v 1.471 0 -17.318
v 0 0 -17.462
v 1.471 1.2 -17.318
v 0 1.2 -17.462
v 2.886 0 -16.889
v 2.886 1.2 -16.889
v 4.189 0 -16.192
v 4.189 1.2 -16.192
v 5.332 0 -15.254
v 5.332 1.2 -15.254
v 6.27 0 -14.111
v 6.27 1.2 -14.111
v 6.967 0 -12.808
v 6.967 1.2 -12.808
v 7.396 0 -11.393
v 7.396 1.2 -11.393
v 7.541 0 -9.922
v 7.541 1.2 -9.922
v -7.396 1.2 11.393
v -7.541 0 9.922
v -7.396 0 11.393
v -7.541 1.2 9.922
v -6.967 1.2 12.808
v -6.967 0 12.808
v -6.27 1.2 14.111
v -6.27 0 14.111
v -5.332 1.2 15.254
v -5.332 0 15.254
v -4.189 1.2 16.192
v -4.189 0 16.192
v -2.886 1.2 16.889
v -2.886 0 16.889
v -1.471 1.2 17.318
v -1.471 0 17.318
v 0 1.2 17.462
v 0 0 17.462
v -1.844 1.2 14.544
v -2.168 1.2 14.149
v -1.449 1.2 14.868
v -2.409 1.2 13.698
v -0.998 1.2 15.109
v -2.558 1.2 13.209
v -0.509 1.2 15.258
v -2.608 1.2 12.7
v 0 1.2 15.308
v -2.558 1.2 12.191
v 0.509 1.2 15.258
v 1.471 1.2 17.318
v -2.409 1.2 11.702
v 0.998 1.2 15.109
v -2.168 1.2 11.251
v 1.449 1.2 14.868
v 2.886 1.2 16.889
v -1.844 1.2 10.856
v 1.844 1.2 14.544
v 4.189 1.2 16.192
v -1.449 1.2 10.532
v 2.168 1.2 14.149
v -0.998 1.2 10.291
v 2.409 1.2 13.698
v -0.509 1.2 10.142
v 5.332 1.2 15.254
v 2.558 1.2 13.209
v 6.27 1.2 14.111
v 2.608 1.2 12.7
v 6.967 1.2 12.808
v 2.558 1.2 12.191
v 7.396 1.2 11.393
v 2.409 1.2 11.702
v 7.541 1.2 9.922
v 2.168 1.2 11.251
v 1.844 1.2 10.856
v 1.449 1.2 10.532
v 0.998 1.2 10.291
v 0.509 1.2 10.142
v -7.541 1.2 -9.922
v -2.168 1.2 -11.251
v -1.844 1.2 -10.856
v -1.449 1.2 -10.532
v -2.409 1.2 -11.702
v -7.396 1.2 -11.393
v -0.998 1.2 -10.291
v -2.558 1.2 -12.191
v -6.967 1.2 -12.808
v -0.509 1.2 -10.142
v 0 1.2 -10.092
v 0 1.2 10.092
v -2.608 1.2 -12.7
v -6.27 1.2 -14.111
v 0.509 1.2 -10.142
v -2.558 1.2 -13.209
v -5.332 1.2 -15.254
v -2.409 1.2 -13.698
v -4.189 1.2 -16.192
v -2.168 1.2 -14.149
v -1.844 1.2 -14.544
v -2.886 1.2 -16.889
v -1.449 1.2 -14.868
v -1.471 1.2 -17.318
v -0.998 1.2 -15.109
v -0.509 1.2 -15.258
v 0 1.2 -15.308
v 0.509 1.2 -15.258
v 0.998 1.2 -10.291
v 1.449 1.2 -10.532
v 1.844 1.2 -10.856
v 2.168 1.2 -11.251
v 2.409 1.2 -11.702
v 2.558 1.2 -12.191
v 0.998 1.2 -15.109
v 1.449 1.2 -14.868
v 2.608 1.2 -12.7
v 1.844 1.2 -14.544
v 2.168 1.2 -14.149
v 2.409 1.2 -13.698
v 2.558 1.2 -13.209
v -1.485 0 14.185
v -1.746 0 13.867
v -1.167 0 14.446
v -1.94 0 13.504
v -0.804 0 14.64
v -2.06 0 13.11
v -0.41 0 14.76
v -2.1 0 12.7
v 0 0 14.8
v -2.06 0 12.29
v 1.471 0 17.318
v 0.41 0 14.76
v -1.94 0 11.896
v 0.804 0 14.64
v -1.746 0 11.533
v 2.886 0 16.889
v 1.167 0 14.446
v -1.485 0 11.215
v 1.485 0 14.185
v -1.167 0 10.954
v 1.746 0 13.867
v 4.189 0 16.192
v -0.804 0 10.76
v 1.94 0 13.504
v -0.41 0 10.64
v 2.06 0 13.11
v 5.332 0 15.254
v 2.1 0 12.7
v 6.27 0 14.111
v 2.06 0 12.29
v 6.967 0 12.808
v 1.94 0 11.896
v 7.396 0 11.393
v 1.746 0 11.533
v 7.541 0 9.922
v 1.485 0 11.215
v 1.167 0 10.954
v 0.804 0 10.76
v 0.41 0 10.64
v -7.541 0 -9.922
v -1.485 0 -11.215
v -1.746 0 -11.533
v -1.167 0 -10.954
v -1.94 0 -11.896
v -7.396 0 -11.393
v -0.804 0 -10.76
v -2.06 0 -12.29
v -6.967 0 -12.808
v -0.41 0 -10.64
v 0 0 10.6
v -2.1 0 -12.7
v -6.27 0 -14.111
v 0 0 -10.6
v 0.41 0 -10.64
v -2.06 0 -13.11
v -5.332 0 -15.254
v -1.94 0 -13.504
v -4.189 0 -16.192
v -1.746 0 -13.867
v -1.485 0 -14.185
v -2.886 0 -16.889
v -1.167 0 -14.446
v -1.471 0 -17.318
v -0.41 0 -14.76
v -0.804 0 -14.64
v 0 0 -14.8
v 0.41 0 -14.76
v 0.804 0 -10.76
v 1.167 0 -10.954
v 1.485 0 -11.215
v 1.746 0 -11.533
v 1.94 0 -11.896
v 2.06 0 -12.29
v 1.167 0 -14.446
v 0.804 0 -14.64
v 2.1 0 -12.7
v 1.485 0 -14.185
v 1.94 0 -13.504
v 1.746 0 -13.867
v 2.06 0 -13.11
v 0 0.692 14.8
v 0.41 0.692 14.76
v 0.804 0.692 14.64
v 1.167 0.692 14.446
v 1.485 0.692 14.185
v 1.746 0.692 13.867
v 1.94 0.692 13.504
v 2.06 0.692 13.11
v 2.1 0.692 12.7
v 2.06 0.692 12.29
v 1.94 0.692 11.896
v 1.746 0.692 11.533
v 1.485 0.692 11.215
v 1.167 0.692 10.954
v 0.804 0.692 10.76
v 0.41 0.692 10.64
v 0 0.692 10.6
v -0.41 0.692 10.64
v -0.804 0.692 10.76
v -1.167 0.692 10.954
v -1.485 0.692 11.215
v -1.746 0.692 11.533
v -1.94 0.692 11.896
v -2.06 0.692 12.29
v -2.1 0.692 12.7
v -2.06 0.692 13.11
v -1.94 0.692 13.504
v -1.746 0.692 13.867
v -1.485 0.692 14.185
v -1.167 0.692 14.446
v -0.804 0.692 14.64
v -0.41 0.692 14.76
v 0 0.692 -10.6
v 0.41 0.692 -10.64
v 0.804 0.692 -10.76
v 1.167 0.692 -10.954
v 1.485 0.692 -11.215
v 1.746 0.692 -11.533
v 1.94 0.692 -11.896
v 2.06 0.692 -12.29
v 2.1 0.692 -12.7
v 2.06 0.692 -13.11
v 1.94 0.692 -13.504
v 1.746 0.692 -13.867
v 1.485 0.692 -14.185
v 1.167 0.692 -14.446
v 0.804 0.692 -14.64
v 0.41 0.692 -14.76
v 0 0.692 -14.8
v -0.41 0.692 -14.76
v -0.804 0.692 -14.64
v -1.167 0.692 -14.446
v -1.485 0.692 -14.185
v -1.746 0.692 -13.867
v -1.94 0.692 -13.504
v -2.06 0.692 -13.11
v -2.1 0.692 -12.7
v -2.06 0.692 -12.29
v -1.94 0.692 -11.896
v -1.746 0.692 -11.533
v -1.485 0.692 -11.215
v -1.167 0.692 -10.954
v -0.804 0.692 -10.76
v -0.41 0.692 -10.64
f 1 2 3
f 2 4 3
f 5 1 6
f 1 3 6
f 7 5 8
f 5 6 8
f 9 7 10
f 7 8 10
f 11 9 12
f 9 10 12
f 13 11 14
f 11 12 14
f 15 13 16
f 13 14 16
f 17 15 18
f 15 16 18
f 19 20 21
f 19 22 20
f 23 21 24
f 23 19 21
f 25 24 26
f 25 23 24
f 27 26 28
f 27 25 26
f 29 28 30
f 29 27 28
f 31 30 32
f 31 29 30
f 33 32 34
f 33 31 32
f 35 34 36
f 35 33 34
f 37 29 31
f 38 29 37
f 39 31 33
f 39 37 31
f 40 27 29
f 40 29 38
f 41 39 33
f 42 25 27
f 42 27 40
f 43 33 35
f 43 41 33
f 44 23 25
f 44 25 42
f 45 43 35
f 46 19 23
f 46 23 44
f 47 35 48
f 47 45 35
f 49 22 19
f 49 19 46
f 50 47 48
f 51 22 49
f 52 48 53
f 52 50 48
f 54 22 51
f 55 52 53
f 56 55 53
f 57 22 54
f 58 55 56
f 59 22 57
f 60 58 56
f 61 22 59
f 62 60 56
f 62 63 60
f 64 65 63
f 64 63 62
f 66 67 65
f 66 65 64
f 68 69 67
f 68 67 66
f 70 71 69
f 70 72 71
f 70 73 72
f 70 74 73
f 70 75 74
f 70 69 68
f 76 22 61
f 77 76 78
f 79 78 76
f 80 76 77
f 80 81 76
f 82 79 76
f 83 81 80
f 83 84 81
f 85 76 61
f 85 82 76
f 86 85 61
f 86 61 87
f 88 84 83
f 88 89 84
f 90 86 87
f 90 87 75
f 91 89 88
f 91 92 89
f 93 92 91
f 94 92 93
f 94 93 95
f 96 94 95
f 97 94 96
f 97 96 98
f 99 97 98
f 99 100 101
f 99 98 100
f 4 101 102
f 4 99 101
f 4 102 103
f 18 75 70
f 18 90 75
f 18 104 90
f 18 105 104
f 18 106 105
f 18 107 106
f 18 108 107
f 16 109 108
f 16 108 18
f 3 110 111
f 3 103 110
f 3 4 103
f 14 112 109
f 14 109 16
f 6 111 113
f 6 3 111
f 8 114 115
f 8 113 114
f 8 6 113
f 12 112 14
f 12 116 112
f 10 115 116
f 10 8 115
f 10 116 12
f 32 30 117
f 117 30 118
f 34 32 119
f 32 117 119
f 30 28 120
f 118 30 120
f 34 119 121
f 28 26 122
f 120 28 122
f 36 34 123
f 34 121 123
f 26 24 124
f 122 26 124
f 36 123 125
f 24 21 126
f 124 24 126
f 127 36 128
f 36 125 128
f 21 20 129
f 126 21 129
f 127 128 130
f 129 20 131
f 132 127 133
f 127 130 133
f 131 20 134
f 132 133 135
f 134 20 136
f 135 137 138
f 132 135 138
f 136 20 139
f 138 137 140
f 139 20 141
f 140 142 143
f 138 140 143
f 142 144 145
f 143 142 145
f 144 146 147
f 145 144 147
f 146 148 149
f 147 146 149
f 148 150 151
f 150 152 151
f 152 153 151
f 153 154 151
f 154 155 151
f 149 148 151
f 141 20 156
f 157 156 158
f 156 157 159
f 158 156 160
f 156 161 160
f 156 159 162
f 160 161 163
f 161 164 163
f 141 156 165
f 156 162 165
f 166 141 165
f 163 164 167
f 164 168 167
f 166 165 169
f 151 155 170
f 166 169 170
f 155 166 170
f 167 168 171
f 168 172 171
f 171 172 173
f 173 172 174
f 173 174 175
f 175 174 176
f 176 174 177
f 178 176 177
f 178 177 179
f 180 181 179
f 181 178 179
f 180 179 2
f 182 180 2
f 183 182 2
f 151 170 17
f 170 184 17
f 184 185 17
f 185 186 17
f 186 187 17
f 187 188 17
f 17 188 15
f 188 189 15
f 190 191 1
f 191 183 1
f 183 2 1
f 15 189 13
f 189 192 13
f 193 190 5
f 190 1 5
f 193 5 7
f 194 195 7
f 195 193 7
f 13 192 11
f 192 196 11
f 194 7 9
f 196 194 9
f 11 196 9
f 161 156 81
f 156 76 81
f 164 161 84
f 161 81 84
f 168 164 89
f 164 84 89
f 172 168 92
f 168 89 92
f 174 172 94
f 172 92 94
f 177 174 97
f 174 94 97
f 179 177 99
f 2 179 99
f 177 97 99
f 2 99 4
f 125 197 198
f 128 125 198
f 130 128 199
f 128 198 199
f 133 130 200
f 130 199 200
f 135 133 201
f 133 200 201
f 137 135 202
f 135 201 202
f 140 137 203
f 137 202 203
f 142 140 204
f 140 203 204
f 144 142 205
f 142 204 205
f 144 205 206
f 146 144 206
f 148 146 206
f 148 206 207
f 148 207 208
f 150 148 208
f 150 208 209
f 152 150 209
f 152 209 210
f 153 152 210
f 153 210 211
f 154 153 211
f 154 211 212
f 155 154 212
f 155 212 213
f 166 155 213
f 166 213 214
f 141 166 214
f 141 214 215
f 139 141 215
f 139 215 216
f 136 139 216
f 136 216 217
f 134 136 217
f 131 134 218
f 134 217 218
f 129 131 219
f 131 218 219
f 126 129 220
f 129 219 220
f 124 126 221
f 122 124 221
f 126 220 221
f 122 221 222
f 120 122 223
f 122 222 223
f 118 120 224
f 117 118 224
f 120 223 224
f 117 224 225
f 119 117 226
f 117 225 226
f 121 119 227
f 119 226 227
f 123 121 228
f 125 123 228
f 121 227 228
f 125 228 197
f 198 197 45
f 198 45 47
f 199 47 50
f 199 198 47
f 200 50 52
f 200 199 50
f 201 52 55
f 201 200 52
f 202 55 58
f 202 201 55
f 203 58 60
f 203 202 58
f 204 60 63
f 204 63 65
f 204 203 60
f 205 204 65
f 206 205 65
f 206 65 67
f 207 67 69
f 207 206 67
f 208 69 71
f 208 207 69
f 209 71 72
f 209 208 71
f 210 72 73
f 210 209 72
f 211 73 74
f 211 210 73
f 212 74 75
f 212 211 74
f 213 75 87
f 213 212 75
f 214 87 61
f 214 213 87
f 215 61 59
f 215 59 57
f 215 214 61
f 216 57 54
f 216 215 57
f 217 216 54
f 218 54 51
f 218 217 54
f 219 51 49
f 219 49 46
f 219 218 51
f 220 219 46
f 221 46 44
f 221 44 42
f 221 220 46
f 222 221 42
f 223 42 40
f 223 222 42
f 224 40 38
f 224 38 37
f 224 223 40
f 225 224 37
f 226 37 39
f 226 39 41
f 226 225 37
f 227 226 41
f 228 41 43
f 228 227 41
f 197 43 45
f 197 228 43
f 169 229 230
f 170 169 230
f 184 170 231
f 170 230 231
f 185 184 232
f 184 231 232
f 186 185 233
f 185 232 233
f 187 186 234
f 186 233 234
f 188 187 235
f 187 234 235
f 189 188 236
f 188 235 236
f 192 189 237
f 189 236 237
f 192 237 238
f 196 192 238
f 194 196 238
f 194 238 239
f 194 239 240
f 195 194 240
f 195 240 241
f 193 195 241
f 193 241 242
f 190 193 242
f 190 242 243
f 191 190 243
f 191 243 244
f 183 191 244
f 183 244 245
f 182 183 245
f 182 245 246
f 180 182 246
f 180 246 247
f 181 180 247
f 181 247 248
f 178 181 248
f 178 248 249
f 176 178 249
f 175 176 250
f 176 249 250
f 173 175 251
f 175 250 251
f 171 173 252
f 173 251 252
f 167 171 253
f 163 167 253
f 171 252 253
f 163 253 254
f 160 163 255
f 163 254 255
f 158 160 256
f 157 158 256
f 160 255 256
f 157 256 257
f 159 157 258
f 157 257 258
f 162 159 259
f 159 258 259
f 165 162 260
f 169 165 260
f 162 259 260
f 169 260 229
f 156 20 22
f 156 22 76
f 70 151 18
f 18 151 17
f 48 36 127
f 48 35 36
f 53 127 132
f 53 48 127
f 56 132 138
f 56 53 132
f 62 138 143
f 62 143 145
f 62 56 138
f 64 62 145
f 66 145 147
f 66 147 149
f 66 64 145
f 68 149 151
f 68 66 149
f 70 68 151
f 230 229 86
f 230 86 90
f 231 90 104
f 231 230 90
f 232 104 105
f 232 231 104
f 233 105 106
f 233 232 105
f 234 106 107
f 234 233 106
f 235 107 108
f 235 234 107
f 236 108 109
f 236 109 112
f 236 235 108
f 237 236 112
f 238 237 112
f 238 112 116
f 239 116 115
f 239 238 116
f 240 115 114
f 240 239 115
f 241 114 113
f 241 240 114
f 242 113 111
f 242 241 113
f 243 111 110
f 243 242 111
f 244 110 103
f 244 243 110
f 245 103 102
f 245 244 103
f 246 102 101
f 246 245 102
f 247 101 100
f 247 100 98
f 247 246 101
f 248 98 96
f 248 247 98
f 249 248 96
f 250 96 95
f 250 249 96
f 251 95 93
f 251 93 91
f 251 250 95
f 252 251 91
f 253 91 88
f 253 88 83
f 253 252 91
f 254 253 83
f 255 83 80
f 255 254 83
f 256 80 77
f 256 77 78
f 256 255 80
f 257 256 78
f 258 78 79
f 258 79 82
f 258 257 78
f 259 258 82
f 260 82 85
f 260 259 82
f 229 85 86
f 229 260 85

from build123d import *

# Parameters (mm, degrees)
SKETCH1_W      = 15.08125
SKETCH1_H      = 34.925
EXTRUDE1_DEPTH = 1.2
SKETCH3_R      = 2.1
EXTRUDE2_DEPTH = 1.984375
CHAMFER1_SIZE  = 0.508
FILLET1_R      = 7.540625
FILLET2_R      = 7.540625


with BuildPart() as part:
    # Sketch1 → Extrude1 (new body)
    with BuildSketch(Plane(origin=(0, 0, 0), x_dir=(1, 0, 0), z_dir=(0, 1, 0))):
        Rectangle(SKETCH1_W, SKETCH1_H)
    extrude(amount=EXTRUDE1_DEPTH)

    # Sketch3 → Extrude2 (cut)
    with BuildSketch(Plane(origin=(0, 1.2, 0), x_dir=(1, 0, 0), z_dir=(0, 1, 0))):
        with Locations(Location((0, 12.7, 0), (0, 0, 270))):
            Circle(SKETCH3_R)
        with Locations(Location((0, -12.7, 0), (0, 0, 270))):
            Circle(SKETCH3_R)
    extrude(amount=-EXTRUDE2_DEPTH, mode=Mode.SUBTRACT)

    # Chamfer1
    chamfer1_edges = [part.edges().sort_by_distance(p)[0] for p in [
        (0, 1.2, -14.8),
        (0, 1.2, 10.6),
    ]]
    chamfer(chamfer1_edges, length=CHAMFER1_SIZE)

    # Fillet1
    fillet1_edges = [part.edges().sort_by_distance(p)[0] for p in [
        (-7.540625, 0.6, -17.4625),
    ]]
    fillet(fillet1_edges, radius=FILLET1_R)

    # Fillet2
    fillet2_edges = [part.edges().sort_by_distance(p)[0] for p in [
        (7.540625, 0.6, 17.4625),
        (-7.540625, 0.6, 17.4625),
        (7.540625, 0.6, -17.4625),
    ]]
    fillet(fillet2_edges, radius=FILLET2_R - 0.0001)  # a hair under: the kernel refuses the full size


solid = part.part
